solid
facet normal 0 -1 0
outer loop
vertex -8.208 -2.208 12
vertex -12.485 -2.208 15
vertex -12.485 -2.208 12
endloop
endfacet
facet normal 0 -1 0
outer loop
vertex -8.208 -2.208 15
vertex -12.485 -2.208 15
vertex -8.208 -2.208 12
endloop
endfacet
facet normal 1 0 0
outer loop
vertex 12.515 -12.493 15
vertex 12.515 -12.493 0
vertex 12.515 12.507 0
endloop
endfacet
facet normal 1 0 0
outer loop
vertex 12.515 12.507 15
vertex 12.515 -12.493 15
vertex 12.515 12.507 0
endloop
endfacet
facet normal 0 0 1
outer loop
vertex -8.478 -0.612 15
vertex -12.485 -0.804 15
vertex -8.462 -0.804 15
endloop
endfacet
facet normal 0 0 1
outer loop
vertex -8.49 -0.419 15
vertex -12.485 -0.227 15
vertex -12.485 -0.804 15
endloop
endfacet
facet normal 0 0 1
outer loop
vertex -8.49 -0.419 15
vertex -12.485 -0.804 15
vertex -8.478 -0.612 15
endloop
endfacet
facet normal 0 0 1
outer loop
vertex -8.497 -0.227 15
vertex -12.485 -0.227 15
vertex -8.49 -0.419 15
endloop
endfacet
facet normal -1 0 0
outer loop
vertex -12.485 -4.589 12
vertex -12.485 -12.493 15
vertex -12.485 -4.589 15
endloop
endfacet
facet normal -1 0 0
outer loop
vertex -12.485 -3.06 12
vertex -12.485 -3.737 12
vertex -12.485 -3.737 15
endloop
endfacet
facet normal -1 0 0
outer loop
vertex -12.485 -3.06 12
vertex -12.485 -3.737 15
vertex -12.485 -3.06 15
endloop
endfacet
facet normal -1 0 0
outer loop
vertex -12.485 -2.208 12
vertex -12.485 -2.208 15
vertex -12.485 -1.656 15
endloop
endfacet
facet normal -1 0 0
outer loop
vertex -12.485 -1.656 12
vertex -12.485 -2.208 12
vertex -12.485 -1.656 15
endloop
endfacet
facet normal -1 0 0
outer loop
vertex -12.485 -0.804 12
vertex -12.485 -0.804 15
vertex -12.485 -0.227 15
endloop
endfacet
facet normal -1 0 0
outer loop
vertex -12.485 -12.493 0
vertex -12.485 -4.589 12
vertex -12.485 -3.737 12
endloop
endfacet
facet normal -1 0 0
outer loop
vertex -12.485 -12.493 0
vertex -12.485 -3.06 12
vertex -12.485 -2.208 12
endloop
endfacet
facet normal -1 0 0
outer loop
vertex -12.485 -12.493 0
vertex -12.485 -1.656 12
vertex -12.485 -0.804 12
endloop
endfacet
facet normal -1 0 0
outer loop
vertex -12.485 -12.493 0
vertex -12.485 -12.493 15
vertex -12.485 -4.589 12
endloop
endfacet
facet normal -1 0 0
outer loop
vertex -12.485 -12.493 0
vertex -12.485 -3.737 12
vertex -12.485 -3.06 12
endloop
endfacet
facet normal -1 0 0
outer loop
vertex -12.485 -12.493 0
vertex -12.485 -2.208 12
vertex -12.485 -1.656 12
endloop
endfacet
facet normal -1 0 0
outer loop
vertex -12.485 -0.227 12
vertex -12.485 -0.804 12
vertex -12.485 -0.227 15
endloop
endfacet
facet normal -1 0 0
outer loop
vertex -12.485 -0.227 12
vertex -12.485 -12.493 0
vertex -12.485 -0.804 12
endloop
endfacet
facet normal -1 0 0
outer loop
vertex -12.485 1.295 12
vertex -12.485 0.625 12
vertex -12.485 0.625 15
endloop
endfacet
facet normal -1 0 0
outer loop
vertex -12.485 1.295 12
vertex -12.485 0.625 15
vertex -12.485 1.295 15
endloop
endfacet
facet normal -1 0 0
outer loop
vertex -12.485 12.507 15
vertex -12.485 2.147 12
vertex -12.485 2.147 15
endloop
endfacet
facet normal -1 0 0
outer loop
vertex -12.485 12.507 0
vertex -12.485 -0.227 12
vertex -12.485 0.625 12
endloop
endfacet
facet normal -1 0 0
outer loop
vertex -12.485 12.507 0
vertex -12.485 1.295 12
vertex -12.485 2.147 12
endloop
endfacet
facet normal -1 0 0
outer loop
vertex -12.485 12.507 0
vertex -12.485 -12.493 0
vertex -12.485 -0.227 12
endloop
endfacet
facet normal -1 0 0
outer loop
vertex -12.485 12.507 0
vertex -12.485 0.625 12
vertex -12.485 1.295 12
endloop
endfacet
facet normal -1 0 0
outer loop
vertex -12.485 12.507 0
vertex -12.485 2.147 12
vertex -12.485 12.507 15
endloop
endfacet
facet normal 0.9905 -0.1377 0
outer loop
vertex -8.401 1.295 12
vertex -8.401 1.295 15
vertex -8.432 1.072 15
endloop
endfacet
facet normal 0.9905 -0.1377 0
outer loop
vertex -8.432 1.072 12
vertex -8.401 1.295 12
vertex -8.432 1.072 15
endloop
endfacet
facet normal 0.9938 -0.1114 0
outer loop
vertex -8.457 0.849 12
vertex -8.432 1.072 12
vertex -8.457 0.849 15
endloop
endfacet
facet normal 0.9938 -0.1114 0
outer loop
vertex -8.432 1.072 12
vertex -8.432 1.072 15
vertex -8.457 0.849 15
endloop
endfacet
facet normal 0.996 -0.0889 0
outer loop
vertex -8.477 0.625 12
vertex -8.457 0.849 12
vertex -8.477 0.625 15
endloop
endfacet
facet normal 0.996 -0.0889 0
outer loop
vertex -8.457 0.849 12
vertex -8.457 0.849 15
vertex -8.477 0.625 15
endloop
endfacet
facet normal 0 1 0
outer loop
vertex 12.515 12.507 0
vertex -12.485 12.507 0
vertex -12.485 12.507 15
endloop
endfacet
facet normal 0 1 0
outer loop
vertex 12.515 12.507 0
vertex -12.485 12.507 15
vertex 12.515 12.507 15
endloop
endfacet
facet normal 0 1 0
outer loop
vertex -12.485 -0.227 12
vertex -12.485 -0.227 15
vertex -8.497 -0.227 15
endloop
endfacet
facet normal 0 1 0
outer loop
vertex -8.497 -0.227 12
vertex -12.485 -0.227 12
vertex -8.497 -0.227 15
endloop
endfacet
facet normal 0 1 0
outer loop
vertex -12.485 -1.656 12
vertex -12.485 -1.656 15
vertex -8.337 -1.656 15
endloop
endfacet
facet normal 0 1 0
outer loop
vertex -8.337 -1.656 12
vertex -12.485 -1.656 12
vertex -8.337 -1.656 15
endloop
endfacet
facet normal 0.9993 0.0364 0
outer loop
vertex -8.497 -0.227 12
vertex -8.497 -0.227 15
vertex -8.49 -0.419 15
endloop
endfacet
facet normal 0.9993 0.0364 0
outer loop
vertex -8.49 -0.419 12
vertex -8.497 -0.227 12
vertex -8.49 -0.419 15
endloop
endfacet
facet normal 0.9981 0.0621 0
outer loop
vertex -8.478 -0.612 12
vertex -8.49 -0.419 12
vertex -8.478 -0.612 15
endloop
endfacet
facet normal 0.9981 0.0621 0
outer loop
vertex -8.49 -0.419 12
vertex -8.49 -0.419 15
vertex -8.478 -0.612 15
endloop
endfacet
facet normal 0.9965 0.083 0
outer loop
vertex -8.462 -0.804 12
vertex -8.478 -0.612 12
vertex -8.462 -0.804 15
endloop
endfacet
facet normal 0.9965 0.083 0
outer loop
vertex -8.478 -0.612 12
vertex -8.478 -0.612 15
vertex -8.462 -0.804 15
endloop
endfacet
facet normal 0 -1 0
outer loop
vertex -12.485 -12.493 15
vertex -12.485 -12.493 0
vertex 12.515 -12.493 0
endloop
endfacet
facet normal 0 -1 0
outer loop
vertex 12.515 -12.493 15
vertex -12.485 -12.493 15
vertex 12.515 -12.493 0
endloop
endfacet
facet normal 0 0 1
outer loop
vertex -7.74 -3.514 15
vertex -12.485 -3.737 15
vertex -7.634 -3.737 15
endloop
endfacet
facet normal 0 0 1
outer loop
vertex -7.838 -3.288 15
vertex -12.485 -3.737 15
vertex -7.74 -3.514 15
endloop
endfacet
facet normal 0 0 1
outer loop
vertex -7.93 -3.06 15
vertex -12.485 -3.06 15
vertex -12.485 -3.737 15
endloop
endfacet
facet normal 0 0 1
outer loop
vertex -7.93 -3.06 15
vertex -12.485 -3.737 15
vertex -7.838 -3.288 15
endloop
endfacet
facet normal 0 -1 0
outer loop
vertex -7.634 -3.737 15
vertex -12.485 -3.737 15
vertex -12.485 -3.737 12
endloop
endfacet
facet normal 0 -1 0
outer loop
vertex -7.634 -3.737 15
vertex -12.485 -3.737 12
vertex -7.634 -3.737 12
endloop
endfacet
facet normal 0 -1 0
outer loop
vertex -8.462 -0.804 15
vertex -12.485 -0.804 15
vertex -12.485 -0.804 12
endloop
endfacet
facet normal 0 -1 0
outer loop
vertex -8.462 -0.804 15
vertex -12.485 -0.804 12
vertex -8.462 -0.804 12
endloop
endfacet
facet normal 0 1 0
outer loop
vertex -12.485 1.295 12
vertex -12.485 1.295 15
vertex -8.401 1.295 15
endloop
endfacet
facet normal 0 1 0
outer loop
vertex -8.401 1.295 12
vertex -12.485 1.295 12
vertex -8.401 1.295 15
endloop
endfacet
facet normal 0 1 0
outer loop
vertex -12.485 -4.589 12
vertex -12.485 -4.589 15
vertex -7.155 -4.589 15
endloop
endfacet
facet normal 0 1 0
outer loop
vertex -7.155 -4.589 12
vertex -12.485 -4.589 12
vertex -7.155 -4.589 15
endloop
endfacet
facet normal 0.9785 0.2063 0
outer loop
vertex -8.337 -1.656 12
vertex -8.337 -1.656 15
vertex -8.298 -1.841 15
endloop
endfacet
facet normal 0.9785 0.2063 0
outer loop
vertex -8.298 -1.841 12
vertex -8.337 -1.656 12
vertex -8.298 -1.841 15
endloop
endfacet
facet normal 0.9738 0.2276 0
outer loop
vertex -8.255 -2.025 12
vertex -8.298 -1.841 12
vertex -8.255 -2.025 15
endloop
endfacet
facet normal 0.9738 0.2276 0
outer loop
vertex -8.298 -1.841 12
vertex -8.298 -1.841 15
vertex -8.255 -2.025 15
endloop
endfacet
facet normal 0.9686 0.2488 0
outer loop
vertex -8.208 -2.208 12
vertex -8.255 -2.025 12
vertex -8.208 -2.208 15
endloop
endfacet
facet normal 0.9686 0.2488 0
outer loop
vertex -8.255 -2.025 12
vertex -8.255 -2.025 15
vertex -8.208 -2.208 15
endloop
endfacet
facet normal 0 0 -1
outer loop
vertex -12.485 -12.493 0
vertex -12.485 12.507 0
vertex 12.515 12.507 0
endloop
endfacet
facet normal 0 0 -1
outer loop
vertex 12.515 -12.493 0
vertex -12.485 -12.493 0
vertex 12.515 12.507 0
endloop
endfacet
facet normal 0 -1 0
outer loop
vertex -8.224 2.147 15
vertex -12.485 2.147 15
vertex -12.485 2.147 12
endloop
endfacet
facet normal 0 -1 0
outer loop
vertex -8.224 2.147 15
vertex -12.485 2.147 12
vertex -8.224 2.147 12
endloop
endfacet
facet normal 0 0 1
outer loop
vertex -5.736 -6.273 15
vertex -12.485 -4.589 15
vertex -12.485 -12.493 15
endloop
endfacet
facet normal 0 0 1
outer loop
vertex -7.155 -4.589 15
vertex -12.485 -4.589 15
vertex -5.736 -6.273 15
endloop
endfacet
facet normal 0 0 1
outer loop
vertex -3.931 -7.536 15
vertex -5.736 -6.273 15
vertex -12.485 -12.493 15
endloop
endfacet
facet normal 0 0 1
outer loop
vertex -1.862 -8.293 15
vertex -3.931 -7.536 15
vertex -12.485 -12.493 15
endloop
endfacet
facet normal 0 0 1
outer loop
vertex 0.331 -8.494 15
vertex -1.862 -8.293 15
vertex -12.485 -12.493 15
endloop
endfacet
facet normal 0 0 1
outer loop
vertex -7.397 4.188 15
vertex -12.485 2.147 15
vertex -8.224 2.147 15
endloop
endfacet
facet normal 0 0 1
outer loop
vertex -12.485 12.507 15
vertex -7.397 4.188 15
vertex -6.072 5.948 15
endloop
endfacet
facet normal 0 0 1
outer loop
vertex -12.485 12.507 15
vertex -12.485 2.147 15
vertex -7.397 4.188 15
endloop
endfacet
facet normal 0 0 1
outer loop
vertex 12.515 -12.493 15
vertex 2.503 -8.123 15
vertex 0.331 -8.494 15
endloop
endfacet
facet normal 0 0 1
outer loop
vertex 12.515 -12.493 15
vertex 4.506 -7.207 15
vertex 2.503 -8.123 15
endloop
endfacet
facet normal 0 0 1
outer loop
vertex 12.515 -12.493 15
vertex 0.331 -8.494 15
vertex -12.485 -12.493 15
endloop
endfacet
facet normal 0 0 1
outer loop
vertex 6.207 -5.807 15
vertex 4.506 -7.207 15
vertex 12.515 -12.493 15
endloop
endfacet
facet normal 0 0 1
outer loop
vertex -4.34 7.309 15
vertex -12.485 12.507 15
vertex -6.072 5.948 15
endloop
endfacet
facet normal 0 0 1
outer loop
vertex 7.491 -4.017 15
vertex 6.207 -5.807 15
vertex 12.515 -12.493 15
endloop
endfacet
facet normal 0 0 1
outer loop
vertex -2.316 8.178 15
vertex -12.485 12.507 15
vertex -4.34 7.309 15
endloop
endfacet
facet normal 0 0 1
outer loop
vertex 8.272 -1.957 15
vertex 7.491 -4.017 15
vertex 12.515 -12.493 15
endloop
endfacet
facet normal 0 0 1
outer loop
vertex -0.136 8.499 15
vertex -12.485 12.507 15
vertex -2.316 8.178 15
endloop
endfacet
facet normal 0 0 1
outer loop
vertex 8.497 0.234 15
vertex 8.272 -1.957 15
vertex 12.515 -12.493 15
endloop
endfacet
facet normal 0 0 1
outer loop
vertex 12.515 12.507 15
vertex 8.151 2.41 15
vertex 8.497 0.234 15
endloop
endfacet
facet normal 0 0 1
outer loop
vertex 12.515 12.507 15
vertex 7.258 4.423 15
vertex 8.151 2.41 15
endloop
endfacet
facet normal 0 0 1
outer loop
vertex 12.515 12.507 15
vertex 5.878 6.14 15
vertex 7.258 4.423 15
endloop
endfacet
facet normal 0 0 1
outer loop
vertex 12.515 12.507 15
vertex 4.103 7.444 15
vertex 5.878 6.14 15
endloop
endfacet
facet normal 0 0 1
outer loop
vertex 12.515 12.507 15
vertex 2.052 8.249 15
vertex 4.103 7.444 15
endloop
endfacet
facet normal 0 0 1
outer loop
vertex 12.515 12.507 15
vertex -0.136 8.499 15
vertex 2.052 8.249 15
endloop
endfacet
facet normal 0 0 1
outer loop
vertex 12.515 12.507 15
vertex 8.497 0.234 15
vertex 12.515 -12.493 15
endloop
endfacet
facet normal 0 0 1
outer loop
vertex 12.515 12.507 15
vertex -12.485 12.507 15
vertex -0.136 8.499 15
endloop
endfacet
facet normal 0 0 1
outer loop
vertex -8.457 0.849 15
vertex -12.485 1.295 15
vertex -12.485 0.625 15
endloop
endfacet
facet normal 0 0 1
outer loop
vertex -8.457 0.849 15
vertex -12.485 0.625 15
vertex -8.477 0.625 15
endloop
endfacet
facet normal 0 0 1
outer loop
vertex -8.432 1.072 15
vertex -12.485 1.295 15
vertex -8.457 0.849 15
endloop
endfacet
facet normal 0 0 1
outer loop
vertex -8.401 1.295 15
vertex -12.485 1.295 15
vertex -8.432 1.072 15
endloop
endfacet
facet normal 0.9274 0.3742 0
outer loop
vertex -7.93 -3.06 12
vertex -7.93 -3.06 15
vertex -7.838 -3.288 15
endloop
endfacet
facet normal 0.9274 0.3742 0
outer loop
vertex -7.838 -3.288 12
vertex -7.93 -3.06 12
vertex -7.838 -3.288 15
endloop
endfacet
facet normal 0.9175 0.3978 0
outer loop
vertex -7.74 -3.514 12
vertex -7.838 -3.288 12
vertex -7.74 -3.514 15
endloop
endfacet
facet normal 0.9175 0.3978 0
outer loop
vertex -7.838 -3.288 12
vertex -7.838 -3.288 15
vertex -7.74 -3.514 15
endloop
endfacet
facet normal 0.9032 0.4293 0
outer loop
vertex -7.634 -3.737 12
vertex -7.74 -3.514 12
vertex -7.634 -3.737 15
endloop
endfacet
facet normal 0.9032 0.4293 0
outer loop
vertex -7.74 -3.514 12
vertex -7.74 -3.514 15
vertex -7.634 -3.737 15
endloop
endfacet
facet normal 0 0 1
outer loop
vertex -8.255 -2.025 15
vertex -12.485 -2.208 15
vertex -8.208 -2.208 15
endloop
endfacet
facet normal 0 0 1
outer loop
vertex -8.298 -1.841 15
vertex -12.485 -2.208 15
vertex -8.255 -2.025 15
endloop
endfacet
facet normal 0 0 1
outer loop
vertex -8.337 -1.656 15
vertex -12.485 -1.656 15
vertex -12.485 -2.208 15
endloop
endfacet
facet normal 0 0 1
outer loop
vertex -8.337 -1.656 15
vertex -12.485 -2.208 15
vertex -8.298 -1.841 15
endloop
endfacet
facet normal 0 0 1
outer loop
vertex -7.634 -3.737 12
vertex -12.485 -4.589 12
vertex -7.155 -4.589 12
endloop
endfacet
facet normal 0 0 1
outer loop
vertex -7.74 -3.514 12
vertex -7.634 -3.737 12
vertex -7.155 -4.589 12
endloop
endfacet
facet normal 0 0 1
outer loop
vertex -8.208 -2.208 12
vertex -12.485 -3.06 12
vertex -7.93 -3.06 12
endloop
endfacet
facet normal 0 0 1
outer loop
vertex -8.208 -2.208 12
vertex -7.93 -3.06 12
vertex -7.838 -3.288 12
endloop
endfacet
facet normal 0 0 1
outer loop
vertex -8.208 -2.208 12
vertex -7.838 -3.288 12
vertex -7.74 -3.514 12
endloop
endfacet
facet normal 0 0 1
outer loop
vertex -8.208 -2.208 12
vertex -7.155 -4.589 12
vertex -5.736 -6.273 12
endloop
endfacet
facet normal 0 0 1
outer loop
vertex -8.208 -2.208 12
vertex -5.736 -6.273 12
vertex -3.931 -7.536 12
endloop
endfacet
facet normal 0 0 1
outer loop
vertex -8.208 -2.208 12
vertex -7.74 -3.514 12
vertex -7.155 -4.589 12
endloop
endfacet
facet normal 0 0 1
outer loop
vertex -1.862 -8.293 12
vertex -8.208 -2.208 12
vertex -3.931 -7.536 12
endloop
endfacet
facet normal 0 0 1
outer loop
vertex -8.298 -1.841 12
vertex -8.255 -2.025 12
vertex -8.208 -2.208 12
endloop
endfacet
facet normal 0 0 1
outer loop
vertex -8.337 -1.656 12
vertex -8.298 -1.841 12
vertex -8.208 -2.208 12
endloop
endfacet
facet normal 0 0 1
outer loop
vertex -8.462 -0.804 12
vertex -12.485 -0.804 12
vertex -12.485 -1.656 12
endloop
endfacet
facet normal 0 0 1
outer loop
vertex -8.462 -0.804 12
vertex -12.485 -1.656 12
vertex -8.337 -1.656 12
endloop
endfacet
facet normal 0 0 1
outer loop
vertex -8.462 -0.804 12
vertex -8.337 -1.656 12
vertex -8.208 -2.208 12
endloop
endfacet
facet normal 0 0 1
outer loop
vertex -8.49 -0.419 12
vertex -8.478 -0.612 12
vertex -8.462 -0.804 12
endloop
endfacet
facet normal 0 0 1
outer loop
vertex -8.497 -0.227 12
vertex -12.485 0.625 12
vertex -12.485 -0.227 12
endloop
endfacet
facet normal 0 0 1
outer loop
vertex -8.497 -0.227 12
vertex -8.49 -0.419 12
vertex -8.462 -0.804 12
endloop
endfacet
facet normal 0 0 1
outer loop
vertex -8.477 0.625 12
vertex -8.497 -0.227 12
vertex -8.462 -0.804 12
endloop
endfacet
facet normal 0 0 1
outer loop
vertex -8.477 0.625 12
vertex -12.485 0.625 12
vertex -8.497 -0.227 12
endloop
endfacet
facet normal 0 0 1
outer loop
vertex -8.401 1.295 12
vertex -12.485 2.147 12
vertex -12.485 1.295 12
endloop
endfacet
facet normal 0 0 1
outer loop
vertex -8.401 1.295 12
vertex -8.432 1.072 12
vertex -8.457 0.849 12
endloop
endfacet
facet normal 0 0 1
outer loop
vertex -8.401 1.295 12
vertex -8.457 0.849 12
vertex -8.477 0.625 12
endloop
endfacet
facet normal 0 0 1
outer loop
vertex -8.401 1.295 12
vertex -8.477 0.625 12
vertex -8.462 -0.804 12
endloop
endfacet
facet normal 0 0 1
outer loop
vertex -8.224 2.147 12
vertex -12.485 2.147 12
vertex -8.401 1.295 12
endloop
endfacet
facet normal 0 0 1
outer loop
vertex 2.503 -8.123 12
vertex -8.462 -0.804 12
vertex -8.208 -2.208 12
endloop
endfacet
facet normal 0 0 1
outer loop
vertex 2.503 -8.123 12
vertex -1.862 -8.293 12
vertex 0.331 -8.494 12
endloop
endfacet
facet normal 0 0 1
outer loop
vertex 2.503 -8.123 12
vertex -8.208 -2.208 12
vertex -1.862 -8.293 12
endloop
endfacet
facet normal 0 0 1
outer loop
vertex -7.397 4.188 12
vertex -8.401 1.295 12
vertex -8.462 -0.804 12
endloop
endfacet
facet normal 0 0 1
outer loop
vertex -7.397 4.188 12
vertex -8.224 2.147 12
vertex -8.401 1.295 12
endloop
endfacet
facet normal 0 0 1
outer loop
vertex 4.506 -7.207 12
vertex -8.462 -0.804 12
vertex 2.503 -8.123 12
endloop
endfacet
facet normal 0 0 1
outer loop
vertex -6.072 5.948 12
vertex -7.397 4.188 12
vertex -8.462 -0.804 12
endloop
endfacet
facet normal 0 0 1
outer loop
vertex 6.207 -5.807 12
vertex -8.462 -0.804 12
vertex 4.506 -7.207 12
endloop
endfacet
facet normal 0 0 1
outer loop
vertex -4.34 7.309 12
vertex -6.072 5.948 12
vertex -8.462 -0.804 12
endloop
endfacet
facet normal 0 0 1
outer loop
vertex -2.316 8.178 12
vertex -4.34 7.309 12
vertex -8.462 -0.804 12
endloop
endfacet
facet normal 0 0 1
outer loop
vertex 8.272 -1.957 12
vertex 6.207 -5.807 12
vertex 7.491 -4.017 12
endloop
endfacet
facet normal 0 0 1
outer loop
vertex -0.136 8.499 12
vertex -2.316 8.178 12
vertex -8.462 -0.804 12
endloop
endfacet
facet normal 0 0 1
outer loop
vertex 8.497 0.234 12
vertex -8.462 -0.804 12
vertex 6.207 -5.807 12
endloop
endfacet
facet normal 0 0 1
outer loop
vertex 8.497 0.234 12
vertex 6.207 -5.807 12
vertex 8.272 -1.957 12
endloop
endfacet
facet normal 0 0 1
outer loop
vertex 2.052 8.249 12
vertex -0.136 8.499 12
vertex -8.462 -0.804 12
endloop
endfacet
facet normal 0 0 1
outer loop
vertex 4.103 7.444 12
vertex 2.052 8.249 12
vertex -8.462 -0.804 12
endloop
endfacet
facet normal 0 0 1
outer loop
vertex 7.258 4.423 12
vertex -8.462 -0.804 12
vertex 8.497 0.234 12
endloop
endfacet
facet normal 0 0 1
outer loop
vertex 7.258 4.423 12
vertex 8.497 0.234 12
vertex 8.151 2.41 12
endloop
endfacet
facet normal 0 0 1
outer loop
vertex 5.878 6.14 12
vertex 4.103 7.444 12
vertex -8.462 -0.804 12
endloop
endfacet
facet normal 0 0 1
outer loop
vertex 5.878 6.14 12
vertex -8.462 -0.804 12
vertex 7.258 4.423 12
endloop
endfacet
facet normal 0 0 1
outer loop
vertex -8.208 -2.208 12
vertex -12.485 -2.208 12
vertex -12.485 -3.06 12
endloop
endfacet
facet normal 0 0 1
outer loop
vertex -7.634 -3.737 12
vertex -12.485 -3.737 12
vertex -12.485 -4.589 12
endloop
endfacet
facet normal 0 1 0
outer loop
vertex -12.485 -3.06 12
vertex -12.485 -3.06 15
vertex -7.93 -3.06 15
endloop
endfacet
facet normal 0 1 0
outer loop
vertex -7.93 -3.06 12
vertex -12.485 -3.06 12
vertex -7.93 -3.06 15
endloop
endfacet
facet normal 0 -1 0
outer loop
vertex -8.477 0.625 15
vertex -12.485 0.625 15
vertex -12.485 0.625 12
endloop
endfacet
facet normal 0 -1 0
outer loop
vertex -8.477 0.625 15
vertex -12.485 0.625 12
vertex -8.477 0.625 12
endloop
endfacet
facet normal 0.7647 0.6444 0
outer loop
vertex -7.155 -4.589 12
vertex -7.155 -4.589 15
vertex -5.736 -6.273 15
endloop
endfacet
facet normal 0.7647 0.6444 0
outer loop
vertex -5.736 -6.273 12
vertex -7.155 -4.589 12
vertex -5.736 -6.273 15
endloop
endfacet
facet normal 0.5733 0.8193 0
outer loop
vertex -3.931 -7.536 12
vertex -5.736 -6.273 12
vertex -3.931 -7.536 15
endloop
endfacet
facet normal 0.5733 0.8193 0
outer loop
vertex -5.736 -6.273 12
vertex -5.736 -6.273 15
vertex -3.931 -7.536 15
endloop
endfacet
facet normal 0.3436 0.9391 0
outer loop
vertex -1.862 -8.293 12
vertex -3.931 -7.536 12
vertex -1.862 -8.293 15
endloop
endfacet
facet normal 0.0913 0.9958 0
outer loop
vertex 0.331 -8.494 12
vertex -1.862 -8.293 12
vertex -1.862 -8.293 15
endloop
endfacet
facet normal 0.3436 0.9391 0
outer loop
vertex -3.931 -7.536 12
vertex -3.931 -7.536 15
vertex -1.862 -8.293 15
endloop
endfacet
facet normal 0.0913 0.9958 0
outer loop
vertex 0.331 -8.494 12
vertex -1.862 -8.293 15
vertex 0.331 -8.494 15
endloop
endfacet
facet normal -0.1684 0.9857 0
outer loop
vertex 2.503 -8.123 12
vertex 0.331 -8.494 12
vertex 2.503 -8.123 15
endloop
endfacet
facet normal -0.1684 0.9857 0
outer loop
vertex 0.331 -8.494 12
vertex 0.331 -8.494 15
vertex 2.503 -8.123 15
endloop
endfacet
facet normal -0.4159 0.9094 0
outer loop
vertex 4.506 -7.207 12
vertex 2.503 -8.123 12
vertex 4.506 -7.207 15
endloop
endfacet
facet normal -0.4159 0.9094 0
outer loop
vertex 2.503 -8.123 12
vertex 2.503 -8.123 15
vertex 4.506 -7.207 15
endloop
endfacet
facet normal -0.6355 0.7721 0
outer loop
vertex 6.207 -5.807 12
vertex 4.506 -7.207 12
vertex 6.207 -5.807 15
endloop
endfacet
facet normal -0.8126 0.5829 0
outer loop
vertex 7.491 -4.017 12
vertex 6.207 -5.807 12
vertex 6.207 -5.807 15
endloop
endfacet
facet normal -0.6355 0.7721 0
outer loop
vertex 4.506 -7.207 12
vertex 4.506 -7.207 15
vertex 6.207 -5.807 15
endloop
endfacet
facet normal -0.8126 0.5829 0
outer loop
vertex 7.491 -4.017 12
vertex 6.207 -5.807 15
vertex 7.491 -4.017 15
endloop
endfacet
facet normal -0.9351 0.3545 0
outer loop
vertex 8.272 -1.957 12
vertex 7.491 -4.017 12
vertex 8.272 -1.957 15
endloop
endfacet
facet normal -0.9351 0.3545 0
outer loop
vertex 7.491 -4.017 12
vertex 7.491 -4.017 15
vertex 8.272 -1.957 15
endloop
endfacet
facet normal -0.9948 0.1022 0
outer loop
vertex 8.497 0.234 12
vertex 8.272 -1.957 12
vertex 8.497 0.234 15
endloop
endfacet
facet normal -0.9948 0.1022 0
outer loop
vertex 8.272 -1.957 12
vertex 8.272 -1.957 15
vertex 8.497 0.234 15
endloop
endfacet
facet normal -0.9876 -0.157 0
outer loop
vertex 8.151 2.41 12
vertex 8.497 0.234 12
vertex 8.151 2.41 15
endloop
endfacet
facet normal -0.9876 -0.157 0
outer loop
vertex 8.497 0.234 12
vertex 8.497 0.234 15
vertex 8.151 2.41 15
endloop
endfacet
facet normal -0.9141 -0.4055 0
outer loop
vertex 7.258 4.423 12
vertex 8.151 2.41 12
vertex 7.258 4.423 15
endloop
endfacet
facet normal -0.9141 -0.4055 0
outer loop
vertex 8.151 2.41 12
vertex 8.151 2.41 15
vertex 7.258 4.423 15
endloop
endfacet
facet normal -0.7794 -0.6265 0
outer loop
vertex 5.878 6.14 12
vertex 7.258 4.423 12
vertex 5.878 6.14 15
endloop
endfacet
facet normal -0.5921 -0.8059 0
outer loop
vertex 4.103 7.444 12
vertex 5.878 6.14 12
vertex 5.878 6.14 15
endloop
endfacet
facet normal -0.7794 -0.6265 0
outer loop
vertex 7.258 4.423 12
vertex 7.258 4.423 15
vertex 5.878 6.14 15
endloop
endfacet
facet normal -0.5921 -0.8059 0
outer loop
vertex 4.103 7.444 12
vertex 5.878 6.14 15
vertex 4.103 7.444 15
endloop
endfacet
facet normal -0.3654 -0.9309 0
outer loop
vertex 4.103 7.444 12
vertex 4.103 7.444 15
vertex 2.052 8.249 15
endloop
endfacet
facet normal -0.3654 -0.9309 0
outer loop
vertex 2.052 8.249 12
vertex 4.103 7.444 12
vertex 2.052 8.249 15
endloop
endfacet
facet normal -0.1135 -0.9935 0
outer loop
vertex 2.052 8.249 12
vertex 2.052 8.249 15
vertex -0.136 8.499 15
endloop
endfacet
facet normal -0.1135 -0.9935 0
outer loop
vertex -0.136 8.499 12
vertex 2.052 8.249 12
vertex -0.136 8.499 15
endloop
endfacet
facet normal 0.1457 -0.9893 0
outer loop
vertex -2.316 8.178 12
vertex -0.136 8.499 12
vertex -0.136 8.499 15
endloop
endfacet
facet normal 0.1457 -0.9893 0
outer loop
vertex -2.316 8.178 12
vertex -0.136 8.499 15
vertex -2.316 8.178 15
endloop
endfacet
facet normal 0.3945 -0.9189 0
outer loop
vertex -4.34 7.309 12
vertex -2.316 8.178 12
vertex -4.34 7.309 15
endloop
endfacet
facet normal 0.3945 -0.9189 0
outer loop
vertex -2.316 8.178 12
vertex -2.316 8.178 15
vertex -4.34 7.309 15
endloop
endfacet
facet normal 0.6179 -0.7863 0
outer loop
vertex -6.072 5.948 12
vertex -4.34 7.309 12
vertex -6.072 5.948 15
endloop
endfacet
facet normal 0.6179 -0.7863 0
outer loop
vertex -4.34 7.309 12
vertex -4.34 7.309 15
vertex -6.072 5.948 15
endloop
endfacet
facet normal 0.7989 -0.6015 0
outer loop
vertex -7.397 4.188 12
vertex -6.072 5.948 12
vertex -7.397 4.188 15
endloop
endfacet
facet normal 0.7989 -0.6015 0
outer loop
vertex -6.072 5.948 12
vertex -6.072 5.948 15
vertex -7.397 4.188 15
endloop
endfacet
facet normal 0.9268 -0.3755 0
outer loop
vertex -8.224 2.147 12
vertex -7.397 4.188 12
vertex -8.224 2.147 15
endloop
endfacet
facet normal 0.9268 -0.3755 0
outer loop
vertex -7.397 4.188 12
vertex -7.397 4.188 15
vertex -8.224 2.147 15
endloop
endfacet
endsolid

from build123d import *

# Parameters (mm, degrees)
SKETCH5_W           = 25
SKETCH5_H           = 25
BOSS_EXTRUDE3_DEPTH = 15
SKETCH6_R           = 8.5
SKETCH6_W           = 4.441456536
SKETCH6_H           = 0.851518301
SKETCH6_W_2         = 4.412060549
SKETCH6_H_2         = 0.8515183
SKETCH6_W_3         = 4.475416112
SKETCH6_W_4         = 4.837812326
SKETCH6_W_5         = 5.604508377
CUT_EXTRUDE3_DEPTH  = 3


with BuildPart() as part:
    # Sketch5 → Boss-Extrude3 (new body)
    with BuildSketch(Plane.XY):
        with Locations((0.01465692, 0.007301744)):
            Rectangle(SKETCH5_W, SKETCH5_H)
    extrude(amount=BOSS_EXTRUDE3_DEPTH)

    # Sketch6 → Cut-Extrude3 (cut)
    with BuildSketch(Plane.XY.offset(15)):
        Circle(SKETCH6_R)
        with Locations((-10.445228229, 1.72077303)):
            Rectangle(SKETCH6_W, SKETCH6_H)
        with Locations((-10.459926223, 0.199178628)):
            Rectangle(SKETCH6_W_2, SKETCH6_H_2)
        with Locations((-10.451337758, -1.230194922)):
            Rectangle(SKETCH6_W_3, SKETCH6_H_2)
        with Locations((-10.270139651, -2.633825362)):
            Rectangle(SKETCH6_W_4, SKETCH6_H)
        with Locations((-9.909880943, -4.16280996)):
            Rectangle(SKETCH6_W_5, SKETCH6_H)
    extrude(amount=-CUT_EXTRUDE3_DEPTH, mode=Mode.SUBTRACT)


solid = part.part
